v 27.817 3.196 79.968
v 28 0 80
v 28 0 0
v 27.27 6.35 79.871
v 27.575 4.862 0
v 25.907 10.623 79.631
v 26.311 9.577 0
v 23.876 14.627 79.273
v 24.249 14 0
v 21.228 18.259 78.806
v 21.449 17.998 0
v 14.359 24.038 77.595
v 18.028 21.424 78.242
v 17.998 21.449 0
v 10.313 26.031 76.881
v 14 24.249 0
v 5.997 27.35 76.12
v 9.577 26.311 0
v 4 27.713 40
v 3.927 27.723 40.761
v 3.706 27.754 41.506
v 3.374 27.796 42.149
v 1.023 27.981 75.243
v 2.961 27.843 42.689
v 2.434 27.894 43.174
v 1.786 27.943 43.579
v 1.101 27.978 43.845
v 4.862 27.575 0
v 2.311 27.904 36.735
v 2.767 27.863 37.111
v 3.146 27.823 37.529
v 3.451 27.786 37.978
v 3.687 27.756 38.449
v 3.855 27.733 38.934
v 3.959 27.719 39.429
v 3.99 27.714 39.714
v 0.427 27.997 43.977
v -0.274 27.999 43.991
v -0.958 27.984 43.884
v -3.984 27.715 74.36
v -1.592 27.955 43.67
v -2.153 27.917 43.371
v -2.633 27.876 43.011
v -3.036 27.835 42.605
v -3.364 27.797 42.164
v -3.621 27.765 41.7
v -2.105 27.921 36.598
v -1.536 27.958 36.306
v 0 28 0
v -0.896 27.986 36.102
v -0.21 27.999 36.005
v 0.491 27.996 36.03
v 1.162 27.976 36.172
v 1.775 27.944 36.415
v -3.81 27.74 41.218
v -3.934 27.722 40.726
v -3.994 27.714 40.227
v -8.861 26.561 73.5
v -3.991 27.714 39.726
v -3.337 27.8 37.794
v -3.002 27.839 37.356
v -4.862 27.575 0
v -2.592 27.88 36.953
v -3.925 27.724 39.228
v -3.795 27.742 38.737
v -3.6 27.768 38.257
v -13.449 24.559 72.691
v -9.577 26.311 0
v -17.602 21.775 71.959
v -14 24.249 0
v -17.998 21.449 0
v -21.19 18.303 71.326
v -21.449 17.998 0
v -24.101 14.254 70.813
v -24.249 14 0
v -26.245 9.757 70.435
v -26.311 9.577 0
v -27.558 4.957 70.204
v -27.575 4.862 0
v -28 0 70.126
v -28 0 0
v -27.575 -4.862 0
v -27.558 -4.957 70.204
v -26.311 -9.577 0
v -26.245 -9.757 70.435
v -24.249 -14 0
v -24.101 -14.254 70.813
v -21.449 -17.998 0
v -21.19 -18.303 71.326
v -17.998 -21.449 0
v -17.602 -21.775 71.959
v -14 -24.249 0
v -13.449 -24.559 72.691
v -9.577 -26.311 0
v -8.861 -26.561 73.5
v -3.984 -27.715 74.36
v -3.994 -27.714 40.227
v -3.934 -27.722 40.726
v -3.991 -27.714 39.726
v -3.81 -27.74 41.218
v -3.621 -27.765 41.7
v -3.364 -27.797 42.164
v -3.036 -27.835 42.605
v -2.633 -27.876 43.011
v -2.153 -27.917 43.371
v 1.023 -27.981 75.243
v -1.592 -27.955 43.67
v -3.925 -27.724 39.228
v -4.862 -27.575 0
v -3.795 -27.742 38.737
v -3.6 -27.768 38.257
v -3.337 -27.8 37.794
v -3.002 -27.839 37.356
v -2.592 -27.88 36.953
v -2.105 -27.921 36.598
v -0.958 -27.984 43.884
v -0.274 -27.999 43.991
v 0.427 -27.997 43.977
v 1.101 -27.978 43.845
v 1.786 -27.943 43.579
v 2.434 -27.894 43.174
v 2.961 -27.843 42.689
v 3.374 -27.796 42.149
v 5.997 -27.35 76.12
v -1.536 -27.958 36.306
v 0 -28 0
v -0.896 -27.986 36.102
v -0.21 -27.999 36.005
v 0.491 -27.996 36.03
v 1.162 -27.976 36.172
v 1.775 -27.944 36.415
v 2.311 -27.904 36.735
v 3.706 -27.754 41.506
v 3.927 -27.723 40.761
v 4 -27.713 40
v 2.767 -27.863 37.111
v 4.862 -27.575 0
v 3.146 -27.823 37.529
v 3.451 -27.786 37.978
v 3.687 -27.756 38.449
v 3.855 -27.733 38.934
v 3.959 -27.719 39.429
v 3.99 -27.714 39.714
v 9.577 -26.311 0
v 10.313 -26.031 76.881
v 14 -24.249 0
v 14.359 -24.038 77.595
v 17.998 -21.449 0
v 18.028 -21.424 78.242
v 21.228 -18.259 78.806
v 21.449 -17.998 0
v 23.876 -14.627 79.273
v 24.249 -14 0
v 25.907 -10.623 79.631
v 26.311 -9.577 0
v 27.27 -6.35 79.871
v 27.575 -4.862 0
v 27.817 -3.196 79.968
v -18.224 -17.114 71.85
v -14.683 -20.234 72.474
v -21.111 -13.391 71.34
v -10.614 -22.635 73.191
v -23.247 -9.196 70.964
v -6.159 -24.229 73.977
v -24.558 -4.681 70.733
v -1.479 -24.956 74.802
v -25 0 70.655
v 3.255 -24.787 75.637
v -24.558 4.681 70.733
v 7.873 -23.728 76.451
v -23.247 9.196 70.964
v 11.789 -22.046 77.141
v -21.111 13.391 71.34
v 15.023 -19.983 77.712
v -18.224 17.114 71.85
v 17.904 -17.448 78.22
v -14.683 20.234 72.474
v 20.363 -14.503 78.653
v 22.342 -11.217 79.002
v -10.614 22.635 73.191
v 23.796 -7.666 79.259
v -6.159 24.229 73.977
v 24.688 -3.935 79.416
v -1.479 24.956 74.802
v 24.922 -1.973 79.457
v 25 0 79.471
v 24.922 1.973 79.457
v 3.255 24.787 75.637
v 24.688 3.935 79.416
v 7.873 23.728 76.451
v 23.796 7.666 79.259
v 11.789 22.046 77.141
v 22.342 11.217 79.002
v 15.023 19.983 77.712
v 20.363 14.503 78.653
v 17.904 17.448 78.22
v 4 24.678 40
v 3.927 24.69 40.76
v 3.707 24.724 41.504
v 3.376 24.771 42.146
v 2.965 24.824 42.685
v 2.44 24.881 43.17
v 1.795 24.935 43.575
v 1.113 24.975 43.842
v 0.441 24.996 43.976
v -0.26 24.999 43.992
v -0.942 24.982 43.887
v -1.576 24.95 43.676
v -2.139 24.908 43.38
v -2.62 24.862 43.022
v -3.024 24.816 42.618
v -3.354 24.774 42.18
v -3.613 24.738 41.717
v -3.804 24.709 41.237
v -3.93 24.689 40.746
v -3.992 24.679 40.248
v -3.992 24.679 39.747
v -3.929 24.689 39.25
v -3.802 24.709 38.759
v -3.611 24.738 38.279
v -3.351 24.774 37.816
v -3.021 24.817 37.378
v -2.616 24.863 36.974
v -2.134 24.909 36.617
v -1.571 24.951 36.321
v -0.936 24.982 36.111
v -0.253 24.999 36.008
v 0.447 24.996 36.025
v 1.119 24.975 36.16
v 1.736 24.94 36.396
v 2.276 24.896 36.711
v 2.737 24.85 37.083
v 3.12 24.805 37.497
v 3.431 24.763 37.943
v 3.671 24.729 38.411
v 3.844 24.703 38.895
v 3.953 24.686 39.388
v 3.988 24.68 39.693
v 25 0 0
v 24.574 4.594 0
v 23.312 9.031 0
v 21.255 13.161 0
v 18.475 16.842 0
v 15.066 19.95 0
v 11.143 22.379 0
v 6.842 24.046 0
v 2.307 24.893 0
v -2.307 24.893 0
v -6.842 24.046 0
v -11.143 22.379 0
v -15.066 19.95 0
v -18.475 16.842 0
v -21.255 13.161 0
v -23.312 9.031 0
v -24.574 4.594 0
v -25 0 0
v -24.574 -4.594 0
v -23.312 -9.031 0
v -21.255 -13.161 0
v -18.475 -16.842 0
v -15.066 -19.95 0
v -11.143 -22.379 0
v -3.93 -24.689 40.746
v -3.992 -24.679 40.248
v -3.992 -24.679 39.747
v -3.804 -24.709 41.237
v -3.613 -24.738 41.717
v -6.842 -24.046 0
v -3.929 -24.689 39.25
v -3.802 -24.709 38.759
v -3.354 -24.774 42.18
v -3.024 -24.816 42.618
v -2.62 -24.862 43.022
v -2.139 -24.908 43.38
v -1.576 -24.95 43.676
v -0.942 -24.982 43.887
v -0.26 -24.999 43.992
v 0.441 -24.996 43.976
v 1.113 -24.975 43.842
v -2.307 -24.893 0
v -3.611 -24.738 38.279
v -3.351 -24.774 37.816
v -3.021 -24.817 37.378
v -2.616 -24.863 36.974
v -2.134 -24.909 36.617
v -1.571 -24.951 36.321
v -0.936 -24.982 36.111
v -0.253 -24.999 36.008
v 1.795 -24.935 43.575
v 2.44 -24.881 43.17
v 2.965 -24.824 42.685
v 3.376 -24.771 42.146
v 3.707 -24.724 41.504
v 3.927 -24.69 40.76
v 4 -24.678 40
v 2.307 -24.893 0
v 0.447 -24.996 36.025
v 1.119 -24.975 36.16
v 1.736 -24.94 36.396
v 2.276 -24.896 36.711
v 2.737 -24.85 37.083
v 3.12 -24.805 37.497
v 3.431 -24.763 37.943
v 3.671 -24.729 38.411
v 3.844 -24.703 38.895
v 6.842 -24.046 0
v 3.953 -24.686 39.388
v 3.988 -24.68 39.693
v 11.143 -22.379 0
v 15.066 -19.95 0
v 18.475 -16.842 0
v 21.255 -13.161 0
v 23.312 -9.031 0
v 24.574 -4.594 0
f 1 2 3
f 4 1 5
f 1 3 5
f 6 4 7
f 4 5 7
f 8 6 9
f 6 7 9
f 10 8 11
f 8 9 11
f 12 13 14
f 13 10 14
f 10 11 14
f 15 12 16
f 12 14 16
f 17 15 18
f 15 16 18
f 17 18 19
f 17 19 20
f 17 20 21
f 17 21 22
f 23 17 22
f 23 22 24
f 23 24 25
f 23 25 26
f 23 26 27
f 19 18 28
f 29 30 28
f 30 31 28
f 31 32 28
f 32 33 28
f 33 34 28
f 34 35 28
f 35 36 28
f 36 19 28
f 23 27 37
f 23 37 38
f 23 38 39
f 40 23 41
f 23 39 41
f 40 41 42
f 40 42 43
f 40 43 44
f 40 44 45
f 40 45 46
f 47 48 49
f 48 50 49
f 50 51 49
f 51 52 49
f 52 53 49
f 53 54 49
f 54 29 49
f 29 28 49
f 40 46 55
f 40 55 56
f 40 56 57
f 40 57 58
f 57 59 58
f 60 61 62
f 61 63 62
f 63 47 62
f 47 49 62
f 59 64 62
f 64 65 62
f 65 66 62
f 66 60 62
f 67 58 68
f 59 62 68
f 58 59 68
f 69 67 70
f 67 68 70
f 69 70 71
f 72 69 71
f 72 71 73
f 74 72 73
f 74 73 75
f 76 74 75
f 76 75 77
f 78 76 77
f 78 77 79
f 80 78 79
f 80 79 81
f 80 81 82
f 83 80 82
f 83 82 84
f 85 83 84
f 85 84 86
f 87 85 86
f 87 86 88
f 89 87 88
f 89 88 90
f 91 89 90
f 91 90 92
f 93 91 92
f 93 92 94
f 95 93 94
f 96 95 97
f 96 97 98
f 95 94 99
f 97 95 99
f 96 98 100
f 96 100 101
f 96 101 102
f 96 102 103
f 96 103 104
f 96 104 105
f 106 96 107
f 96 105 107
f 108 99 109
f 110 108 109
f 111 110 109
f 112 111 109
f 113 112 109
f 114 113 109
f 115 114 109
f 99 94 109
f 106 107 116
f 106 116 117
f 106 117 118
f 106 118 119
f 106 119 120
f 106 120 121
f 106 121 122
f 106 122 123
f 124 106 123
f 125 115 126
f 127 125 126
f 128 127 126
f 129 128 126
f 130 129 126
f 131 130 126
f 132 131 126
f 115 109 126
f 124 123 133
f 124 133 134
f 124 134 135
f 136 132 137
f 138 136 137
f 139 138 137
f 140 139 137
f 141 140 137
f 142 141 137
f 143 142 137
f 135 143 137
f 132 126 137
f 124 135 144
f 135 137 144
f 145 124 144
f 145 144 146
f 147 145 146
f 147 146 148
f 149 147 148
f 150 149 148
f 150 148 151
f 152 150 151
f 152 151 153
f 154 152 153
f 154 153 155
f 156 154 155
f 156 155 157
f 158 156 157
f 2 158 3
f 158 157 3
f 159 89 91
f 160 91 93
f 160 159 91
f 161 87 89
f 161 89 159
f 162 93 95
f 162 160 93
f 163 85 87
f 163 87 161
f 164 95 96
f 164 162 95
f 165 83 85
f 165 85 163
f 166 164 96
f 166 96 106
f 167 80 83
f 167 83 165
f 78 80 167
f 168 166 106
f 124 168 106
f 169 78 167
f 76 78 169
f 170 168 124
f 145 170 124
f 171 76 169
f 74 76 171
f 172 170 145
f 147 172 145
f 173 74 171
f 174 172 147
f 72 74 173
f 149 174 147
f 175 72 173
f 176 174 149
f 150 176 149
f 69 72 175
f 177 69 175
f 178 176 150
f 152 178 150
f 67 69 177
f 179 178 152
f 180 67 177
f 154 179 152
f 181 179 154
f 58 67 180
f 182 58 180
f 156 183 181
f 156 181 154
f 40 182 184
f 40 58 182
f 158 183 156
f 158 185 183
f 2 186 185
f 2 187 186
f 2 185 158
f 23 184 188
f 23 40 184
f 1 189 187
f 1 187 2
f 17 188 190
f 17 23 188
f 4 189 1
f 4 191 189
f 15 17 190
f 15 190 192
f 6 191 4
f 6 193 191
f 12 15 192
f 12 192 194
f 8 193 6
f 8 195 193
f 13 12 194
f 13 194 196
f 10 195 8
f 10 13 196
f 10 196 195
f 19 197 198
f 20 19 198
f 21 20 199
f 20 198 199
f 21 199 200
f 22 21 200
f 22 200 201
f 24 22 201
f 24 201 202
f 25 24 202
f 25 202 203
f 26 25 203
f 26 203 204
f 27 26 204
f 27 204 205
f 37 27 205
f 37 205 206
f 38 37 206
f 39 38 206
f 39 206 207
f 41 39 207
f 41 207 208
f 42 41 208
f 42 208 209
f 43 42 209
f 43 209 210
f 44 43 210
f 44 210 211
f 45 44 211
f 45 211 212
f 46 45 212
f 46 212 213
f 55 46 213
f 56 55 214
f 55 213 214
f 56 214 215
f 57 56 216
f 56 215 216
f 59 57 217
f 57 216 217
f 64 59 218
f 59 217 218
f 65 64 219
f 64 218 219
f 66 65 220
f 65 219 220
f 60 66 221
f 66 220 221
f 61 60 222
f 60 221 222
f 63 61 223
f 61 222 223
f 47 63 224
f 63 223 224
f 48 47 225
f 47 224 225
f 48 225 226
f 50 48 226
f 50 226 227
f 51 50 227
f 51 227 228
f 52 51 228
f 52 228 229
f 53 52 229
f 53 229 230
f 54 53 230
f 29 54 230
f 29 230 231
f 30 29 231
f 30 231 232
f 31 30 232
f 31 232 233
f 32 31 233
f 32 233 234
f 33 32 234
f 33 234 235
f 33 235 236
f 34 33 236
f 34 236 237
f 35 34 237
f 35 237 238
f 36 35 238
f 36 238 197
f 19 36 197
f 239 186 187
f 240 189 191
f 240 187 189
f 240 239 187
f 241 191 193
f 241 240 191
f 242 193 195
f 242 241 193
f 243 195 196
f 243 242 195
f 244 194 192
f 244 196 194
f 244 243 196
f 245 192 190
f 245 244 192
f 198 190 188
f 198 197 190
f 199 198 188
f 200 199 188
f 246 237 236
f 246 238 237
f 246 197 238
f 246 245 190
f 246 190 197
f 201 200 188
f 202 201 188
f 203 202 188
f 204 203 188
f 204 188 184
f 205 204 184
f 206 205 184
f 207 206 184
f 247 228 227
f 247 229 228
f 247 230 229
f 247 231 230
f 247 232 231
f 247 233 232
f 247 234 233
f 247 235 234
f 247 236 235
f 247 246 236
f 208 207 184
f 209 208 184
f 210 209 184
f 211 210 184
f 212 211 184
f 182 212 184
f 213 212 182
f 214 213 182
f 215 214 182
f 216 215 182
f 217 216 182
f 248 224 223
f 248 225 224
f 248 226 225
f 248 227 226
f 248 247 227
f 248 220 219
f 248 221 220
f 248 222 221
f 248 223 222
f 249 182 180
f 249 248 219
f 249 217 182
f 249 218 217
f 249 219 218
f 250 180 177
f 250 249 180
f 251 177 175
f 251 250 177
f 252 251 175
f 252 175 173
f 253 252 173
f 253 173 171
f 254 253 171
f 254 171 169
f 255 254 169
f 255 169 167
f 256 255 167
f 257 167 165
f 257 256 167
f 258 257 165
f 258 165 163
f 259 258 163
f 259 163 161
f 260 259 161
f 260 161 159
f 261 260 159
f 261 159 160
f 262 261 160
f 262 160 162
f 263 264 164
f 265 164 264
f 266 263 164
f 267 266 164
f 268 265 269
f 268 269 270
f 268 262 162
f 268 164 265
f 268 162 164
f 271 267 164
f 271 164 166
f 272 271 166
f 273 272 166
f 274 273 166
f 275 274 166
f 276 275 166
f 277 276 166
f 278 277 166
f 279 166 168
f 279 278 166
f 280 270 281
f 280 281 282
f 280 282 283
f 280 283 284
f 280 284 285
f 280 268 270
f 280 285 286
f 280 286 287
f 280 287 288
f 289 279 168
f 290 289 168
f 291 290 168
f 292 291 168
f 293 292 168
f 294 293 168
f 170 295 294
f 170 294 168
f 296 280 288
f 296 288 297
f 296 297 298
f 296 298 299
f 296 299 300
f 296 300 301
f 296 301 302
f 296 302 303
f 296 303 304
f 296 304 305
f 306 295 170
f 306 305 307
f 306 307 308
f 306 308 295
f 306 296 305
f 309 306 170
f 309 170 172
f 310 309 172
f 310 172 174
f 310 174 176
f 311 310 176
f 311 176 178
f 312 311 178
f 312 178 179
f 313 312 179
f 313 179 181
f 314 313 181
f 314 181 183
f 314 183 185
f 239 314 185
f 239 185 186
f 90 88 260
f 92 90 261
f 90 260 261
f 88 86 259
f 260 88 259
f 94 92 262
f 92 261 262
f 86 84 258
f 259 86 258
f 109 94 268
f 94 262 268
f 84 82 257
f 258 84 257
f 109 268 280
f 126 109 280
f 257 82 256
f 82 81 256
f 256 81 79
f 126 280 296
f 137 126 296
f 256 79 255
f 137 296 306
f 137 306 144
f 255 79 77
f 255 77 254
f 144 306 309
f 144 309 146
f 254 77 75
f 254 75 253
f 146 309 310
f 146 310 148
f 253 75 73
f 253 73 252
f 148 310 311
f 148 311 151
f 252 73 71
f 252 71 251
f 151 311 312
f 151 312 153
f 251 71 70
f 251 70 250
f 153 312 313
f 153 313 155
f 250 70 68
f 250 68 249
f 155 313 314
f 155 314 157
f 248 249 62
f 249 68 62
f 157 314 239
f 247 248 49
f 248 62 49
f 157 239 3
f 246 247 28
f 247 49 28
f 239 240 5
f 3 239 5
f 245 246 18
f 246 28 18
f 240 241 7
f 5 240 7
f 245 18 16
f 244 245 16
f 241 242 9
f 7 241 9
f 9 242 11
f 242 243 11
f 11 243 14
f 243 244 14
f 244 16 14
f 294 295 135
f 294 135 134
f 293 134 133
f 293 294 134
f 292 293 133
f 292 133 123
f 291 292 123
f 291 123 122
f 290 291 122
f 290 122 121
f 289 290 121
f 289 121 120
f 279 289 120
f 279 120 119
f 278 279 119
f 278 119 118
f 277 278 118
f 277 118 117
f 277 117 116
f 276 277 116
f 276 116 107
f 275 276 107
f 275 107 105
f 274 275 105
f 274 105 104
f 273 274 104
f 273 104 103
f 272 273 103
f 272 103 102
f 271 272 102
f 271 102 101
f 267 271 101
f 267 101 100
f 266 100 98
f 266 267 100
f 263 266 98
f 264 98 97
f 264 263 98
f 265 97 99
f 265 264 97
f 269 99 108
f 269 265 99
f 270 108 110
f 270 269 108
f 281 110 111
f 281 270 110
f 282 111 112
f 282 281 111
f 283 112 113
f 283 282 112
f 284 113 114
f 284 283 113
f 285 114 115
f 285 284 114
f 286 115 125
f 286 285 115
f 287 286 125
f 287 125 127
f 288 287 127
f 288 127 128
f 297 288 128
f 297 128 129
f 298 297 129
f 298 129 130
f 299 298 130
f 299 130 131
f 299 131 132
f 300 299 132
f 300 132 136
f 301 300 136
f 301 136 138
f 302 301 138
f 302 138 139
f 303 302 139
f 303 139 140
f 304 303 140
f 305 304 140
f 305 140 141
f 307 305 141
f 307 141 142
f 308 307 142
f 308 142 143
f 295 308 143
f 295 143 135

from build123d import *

# Parameters (mm, degrees)
F0_R          = 28
F0_R_2        = 25
F1_DEPTH      = 80
F3_DEPTH      = 32.9
F3_DEPTH_BACK = 46.7
F4_R          = 4
F5_DEPTH      = 64.5
F5_DEPTH_BACK = 79.1


with BuildPart() as f1:
    # F0 (on Top) → F1 (new body)
    with BuildSketch(Plane.XY):
        Circle(F0_R)
        Circle(F0_R_2, mode=Mode.SUBTRACT)
    extrude(amount=F1_DEPTH)

    # F2 (on Front) → F3 (cut, two sides)
    with BuildSketch(Plane.XZ) as f3_sk:
        Polygon((-37.074200809, 93.2216271758), (-37.0010906232, 68.5385539477), (28, 80), align=None)
    extrude(amount=-F3_DEPTH, mode=Mode.SUBTRACT)
    extrude(f3_sk.sketch, amount=F3_DEPTH_BACK, mode=Mode.SUBTRACT)

    # F4 (on Front) → F5 (cut, two sides)
    with BuildSketch(Plane.XZ) as f5_sk:
        with Locations((0, 40)):
            Circle(F4_R)
    extrude(amount=-F5_DEPTH, mode=Mode.SUBTRACT)
    extrude(f5_sk.sketch, amount=F5_DEPTH_BACK, mode=Mode.SUBTRACT)


solid = f1.part
